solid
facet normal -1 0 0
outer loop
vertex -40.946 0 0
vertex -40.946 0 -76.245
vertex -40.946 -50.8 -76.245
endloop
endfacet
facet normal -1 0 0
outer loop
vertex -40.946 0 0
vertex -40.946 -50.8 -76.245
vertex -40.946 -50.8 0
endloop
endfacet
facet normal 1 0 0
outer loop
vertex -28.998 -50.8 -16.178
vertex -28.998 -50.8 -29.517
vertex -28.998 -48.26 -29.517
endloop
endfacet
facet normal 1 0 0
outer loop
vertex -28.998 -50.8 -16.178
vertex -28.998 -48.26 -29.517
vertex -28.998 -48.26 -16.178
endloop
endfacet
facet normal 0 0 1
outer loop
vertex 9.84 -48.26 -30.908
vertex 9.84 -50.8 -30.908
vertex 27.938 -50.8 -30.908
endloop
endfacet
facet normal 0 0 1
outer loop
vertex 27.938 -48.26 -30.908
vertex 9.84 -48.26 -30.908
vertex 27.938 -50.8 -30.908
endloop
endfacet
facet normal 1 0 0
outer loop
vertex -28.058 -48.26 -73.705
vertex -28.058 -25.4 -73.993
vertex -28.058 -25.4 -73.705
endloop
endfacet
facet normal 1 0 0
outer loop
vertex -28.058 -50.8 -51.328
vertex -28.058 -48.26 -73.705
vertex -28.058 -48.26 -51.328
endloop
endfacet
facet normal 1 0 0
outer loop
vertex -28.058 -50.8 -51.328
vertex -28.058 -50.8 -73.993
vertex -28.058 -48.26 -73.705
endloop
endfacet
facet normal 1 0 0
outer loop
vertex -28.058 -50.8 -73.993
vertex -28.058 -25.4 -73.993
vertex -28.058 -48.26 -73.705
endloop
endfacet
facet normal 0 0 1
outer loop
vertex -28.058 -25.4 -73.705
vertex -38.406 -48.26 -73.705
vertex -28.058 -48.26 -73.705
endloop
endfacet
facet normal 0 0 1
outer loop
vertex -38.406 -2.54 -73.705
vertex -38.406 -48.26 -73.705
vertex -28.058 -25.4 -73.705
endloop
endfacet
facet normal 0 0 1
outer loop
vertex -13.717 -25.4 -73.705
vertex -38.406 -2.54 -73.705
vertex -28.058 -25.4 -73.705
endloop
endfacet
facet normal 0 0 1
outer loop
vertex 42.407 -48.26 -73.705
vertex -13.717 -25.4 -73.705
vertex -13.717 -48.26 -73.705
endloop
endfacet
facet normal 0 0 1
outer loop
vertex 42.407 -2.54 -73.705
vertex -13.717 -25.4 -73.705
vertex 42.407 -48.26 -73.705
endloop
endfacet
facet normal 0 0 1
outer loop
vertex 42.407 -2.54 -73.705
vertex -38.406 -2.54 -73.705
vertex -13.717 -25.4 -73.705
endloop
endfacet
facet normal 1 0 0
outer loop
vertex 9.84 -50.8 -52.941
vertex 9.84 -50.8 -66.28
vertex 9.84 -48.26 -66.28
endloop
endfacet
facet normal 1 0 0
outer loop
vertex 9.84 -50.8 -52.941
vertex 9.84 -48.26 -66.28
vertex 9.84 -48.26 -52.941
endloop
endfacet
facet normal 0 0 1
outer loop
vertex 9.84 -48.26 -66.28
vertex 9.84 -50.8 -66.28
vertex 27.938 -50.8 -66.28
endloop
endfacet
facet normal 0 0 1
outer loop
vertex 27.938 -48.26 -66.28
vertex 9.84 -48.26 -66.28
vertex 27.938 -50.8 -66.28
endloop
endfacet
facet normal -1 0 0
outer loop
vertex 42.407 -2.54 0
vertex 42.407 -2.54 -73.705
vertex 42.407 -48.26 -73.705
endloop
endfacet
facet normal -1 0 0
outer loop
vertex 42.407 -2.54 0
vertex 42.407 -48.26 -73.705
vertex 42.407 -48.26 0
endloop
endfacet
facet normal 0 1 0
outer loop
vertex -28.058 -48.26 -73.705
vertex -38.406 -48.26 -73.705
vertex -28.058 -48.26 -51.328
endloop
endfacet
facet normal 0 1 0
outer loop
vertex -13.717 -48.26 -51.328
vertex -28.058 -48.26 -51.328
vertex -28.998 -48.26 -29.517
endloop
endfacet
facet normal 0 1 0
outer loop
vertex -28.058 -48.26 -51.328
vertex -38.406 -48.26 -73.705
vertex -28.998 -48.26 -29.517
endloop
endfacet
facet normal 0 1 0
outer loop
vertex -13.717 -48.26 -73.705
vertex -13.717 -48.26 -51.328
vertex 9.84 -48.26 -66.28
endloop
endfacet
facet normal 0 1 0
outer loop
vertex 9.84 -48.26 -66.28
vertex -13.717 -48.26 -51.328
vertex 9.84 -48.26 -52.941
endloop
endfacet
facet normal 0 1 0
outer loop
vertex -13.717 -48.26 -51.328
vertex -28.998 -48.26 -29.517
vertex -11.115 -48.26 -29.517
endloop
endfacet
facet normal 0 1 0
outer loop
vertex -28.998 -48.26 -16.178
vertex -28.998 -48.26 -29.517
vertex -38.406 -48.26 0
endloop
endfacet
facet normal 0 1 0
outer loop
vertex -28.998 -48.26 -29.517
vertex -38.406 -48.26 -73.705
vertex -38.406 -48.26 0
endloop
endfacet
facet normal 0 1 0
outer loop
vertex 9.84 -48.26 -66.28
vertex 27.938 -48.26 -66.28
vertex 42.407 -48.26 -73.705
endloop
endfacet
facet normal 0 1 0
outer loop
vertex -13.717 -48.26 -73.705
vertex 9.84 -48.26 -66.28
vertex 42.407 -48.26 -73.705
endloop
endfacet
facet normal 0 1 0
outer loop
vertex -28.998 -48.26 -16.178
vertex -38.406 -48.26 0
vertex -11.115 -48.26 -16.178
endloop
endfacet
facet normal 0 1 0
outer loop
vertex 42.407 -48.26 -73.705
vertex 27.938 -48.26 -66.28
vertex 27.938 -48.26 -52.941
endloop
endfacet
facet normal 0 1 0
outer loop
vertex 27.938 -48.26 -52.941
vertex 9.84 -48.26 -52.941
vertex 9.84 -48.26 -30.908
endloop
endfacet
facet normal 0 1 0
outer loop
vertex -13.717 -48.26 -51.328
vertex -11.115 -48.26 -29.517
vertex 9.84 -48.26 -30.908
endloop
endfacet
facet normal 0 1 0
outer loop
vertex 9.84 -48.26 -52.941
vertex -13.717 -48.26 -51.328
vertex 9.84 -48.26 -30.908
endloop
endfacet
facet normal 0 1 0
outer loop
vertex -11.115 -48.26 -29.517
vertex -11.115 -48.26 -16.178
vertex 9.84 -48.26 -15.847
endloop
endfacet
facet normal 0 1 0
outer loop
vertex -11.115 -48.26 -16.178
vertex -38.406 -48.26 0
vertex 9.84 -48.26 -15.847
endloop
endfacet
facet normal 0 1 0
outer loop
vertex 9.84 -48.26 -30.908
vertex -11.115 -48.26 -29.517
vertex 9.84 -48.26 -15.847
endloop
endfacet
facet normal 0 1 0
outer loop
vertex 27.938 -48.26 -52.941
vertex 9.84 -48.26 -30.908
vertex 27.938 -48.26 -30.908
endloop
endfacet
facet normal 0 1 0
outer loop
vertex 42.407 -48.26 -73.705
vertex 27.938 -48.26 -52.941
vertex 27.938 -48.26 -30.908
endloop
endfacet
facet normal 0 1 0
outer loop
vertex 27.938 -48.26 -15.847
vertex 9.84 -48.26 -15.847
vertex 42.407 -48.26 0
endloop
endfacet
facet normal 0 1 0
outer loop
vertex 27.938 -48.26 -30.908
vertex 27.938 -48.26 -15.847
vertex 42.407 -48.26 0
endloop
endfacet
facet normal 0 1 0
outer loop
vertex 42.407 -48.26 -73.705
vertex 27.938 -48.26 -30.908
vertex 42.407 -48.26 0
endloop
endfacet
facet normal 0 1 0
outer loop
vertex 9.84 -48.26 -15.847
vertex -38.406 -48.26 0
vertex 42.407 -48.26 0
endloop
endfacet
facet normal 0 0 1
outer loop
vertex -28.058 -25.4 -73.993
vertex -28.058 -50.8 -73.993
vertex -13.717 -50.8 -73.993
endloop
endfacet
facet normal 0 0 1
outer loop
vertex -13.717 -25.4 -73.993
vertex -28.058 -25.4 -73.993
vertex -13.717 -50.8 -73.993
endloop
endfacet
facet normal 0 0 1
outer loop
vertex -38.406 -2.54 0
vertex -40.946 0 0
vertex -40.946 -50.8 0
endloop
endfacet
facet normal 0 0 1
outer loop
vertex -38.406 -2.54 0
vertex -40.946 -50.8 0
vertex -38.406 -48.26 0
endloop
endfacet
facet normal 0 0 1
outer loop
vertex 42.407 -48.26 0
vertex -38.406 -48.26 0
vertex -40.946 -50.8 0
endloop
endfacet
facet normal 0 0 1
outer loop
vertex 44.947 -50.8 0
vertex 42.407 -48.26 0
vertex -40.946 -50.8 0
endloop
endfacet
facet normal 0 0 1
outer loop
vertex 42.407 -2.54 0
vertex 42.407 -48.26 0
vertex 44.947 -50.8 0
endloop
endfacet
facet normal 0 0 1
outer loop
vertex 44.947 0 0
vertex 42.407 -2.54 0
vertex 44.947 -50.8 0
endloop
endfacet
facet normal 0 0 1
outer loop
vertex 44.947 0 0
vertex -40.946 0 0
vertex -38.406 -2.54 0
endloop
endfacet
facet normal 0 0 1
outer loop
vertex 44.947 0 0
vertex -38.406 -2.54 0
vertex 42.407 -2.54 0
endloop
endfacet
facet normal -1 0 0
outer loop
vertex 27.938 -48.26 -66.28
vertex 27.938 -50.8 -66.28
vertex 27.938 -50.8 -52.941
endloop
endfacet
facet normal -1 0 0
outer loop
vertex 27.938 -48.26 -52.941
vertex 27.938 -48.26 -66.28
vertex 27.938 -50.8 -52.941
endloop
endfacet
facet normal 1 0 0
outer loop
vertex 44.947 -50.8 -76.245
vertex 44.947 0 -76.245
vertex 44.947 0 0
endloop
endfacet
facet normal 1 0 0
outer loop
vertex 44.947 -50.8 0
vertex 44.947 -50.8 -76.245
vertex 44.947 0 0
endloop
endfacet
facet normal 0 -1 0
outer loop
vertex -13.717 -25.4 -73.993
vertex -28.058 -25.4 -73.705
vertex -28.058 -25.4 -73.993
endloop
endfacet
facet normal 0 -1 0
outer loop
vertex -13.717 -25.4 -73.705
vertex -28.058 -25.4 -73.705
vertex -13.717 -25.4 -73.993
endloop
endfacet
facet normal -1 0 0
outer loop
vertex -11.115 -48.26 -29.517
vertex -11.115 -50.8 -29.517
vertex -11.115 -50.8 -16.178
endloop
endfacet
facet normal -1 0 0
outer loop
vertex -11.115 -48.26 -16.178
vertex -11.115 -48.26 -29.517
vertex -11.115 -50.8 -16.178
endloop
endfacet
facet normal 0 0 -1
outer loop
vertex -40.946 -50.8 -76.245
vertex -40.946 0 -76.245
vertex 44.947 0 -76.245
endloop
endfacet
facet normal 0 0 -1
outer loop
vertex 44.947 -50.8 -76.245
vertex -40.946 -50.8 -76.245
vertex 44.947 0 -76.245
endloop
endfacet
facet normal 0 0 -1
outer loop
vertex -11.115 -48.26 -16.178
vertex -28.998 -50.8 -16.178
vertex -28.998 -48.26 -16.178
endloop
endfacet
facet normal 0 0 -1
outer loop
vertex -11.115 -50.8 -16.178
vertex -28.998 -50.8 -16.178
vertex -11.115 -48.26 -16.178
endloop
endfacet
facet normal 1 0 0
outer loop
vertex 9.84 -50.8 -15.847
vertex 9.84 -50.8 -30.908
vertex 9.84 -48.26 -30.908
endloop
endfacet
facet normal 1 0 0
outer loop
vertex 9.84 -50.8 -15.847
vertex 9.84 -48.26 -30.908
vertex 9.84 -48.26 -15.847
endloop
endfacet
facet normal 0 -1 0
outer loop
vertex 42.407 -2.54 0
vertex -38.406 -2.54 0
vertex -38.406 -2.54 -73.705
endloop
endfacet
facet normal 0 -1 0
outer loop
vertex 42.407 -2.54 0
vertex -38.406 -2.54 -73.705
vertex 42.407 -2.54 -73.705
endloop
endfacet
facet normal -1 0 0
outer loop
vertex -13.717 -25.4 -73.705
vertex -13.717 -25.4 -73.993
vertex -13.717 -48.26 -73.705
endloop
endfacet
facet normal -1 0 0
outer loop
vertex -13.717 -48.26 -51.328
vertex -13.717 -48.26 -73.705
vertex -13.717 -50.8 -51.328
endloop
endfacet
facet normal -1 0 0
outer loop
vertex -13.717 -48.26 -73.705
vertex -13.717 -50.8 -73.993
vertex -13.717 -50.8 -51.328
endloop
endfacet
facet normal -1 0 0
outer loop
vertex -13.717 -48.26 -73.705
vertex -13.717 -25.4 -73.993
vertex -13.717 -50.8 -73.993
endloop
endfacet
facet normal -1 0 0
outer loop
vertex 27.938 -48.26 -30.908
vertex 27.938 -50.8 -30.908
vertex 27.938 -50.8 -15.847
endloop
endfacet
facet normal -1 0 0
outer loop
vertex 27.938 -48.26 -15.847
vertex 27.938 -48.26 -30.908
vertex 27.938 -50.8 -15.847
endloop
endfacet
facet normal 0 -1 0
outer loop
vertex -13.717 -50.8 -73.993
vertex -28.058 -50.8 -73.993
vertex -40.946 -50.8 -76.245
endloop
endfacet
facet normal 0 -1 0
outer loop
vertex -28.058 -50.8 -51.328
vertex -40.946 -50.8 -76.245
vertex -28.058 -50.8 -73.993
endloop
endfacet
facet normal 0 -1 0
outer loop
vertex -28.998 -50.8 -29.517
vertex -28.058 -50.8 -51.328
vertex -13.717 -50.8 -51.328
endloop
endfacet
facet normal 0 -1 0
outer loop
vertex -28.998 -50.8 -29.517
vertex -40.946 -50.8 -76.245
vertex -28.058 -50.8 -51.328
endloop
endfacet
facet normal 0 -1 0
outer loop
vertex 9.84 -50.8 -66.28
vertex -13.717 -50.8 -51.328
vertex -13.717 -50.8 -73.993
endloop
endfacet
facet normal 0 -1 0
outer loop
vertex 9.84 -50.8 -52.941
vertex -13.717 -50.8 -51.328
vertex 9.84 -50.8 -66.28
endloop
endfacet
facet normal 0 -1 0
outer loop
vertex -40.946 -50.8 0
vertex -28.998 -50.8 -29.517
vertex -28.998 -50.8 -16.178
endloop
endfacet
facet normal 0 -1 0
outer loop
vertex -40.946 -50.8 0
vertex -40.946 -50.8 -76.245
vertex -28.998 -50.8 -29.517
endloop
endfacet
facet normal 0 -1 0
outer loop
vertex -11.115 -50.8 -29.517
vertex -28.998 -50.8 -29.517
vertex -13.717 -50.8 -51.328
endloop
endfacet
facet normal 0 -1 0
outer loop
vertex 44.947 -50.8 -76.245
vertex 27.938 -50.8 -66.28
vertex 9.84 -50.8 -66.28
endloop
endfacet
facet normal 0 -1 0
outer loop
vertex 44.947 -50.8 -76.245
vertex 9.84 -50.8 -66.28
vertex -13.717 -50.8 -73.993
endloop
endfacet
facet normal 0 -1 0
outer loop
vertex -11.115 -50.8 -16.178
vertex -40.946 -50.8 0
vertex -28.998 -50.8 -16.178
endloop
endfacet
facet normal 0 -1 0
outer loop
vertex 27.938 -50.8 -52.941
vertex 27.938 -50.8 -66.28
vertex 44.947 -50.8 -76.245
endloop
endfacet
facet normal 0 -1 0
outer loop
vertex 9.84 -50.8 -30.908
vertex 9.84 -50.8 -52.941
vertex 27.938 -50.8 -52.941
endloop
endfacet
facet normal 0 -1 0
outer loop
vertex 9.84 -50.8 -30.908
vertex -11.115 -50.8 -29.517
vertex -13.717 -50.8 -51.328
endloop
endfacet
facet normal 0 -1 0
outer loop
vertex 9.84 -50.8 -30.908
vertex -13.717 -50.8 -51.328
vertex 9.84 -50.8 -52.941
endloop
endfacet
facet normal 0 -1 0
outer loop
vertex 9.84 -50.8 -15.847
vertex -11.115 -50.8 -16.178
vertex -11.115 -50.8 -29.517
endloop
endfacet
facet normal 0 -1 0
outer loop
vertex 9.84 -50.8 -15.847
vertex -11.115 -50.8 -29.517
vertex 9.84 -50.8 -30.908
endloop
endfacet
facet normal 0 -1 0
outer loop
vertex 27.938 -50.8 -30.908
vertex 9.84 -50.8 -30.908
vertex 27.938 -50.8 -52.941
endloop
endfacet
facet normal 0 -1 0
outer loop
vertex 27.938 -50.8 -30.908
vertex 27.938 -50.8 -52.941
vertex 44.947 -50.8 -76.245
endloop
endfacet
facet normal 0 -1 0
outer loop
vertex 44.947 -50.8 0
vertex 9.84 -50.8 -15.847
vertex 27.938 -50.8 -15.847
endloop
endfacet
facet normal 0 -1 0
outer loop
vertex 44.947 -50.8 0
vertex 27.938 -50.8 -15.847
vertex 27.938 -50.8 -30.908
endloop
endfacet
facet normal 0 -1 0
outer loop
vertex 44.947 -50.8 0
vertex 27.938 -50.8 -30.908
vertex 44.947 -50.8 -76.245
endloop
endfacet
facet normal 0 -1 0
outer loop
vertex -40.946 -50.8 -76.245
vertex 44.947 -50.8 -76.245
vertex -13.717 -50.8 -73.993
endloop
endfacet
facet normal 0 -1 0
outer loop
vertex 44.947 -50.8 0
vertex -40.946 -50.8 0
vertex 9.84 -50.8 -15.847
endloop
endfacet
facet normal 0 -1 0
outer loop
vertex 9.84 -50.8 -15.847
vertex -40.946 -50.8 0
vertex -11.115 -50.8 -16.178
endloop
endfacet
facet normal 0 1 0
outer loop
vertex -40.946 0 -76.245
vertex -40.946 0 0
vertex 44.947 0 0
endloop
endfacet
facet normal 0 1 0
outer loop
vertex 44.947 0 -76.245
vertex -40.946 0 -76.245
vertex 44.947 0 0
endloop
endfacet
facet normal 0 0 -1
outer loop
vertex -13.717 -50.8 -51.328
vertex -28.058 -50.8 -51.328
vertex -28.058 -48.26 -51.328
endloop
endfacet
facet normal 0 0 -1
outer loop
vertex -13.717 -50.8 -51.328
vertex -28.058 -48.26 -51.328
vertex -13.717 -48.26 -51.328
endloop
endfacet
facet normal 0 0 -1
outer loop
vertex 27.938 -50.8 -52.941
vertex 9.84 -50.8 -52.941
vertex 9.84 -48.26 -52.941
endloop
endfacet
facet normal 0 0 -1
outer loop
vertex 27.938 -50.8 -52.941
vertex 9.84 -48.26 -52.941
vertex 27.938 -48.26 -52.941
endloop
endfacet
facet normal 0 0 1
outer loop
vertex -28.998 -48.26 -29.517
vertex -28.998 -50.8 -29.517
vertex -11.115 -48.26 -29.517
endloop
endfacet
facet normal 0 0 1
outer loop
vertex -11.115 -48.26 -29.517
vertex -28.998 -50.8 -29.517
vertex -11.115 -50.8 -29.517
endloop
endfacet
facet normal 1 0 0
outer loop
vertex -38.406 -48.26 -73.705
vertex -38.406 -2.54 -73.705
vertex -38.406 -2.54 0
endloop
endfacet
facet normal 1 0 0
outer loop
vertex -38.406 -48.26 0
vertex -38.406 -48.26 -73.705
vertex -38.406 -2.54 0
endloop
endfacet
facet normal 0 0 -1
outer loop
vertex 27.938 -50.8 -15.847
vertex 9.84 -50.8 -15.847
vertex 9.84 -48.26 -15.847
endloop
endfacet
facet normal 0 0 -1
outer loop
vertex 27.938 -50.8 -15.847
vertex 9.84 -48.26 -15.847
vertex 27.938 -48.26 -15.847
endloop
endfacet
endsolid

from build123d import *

# Parameters (mm, degrees)
F0_W     = 85.893087
F0_H     = 76.244824
F1_DEPTH = 50.8
F2_T     = -2.54
F3_W     = 17.883054
F3_H     = 13.338813
F3_W_2   = 18.097924
F3_H_2   = 15.061585
F3_H_3   = 13.338815
F3_W_3   = 14.340789
F3_H_4   = 22.664875
F4_DEPTH = 25.4


with BuildPart() as f1:
    # F0 (on Front) → F1 (new body)
    with BuildSketch(Plane.XZ):
        with Locations((2.00025, -38.122412)):
            Rectangle(F0_W, F0_H)
    extrude(amount=F1_DEPTH)

    # F2
    f2_openings = [f1.faces().sort_by_distance(p)[0] for p in [
        (2.00025, -25.4, 0),
    ]]
    offset(amount=F2_T, openings=f2_openings)

    # F3 (on face) → F4 (cut)
    with BuildSketch(Plane.XZ.offset(50.8)):
        with Locations((-20.056449, -22.847423)):
            Rectangle(F3_W, F3_H)
        with Locations((18.888849, -23.377542)):
            Rectangle(F3_W_2, F3_H_2)
        with Locations((18.888849, -59.610495)):
            Rectangle(F3_W_2, F3_H_3)
        with Locations((-20.887177, -62.660388)):
            Rectangle(F3_W_3, F3_H_4)
    extrude(amount=-F4_DEPTH, mode=Mode.SUBTRACT)


solid = f1.part
